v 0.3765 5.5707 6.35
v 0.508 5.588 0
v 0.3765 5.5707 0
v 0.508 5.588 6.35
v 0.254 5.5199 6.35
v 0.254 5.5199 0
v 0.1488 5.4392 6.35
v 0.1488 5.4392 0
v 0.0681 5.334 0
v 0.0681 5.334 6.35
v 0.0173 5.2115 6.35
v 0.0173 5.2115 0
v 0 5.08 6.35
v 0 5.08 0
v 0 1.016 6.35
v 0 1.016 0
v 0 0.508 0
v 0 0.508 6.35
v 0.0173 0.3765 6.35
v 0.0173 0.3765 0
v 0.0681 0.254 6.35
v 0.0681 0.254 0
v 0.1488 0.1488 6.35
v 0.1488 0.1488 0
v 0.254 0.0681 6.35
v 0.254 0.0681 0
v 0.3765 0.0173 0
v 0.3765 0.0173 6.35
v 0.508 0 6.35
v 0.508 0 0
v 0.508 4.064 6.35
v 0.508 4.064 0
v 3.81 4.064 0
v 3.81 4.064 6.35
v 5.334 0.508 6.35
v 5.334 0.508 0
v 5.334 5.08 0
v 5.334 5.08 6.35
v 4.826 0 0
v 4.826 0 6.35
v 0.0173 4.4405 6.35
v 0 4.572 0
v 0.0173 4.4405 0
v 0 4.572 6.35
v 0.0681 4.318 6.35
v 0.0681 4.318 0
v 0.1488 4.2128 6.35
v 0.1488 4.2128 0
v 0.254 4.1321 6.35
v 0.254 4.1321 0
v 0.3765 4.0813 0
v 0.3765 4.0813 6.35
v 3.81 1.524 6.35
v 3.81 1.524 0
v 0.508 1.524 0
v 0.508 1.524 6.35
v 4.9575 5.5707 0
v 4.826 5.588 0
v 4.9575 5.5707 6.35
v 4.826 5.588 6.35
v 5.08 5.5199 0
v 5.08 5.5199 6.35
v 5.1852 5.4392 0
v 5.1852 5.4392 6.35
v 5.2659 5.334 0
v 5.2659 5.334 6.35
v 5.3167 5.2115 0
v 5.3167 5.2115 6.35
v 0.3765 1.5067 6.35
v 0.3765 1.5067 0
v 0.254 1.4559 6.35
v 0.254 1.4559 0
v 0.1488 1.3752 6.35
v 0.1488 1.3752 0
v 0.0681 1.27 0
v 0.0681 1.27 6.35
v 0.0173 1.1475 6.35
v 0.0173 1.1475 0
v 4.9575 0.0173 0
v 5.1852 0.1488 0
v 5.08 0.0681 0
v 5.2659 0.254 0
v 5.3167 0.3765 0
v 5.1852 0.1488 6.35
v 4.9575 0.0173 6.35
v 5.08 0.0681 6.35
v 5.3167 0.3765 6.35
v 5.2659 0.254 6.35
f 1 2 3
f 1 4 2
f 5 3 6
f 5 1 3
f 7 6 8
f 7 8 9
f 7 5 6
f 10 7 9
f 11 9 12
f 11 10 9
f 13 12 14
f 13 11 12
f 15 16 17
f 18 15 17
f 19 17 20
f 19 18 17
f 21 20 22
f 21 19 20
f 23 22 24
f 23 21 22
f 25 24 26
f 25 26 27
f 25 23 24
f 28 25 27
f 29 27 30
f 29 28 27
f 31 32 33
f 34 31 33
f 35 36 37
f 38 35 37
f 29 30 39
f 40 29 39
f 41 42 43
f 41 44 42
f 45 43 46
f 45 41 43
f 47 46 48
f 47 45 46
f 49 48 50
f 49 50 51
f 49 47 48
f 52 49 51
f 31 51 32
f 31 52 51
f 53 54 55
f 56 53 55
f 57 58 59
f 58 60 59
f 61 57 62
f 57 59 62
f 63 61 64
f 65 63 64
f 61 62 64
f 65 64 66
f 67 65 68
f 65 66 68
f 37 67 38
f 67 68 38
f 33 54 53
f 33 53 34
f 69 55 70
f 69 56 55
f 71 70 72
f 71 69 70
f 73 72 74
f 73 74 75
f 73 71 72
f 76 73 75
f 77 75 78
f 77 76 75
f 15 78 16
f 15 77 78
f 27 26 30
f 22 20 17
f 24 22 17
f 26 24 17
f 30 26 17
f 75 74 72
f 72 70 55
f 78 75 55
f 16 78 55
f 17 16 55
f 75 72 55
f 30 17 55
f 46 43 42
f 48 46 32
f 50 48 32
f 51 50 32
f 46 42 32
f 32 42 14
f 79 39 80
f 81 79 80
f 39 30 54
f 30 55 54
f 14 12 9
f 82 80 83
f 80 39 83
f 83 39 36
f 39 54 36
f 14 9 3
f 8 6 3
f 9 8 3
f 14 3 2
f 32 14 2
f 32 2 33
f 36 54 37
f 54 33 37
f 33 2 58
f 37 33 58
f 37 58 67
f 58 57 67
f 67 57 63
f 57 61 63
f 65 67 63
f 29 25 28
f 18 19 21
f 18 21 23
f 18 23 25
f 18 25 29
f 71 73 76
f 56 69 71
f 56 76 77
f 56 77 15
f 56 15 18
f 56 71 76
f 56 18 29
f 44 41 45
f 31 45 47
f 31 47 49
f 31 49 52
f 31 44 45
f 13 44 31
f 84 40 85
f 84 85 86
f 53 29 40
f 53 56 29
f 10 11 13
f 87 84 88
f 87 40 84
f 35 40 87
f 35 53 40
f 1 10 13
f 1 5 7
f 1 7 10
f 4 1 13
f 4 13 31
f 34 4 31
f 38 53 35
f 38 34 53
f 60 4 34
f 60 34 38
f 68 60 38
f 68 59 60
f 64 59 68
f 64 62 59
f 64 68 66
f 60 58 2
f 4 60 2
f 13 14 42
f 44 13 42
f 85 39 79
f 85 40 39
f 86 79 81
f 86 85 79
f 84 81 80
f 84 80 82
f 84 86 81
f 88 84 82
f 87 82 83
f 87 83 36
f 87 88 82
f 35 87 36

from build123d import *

# Parameters (mm, degrees)
F0_W     = 1.524
F0_H     = 2.54
F1_DEPTH = 6.35
F2_R     = 0.508


with BuildPart() as f1:
    # F0 (on Top) → F1 (new body)
    with BuildSketch(Plane.XY):
        Polygon((3.81, 4.064), (5.334, 4.064), (5.334, 5.588), (0, 5.588), (0, 4.064), align=None)
        with Locations((4.572, 2.794)):
            Rectangle(F0_W, F0_H)
        Polygon((0, 1.524), (0, 0), (5.334, 0), (5.334, 1.524), (3.81, 1.524), align=None)
    extrude(amount=F1_DEPTH)

    # F2
    f2_edges = [f1.edges().sort_by_distance(p)[0] for p in [
        (0, 4.064, 3.175),
        (0, 5.588, 3.175),
        (0, 1.524, 3.175),
        (0, 0, 3.175),
        (5.334, 0, 3.175),
        (5.334, 5.588, 3.175),
    ]]
    fillet(f2_edges, radius=F2_R)


solid = f1.part
